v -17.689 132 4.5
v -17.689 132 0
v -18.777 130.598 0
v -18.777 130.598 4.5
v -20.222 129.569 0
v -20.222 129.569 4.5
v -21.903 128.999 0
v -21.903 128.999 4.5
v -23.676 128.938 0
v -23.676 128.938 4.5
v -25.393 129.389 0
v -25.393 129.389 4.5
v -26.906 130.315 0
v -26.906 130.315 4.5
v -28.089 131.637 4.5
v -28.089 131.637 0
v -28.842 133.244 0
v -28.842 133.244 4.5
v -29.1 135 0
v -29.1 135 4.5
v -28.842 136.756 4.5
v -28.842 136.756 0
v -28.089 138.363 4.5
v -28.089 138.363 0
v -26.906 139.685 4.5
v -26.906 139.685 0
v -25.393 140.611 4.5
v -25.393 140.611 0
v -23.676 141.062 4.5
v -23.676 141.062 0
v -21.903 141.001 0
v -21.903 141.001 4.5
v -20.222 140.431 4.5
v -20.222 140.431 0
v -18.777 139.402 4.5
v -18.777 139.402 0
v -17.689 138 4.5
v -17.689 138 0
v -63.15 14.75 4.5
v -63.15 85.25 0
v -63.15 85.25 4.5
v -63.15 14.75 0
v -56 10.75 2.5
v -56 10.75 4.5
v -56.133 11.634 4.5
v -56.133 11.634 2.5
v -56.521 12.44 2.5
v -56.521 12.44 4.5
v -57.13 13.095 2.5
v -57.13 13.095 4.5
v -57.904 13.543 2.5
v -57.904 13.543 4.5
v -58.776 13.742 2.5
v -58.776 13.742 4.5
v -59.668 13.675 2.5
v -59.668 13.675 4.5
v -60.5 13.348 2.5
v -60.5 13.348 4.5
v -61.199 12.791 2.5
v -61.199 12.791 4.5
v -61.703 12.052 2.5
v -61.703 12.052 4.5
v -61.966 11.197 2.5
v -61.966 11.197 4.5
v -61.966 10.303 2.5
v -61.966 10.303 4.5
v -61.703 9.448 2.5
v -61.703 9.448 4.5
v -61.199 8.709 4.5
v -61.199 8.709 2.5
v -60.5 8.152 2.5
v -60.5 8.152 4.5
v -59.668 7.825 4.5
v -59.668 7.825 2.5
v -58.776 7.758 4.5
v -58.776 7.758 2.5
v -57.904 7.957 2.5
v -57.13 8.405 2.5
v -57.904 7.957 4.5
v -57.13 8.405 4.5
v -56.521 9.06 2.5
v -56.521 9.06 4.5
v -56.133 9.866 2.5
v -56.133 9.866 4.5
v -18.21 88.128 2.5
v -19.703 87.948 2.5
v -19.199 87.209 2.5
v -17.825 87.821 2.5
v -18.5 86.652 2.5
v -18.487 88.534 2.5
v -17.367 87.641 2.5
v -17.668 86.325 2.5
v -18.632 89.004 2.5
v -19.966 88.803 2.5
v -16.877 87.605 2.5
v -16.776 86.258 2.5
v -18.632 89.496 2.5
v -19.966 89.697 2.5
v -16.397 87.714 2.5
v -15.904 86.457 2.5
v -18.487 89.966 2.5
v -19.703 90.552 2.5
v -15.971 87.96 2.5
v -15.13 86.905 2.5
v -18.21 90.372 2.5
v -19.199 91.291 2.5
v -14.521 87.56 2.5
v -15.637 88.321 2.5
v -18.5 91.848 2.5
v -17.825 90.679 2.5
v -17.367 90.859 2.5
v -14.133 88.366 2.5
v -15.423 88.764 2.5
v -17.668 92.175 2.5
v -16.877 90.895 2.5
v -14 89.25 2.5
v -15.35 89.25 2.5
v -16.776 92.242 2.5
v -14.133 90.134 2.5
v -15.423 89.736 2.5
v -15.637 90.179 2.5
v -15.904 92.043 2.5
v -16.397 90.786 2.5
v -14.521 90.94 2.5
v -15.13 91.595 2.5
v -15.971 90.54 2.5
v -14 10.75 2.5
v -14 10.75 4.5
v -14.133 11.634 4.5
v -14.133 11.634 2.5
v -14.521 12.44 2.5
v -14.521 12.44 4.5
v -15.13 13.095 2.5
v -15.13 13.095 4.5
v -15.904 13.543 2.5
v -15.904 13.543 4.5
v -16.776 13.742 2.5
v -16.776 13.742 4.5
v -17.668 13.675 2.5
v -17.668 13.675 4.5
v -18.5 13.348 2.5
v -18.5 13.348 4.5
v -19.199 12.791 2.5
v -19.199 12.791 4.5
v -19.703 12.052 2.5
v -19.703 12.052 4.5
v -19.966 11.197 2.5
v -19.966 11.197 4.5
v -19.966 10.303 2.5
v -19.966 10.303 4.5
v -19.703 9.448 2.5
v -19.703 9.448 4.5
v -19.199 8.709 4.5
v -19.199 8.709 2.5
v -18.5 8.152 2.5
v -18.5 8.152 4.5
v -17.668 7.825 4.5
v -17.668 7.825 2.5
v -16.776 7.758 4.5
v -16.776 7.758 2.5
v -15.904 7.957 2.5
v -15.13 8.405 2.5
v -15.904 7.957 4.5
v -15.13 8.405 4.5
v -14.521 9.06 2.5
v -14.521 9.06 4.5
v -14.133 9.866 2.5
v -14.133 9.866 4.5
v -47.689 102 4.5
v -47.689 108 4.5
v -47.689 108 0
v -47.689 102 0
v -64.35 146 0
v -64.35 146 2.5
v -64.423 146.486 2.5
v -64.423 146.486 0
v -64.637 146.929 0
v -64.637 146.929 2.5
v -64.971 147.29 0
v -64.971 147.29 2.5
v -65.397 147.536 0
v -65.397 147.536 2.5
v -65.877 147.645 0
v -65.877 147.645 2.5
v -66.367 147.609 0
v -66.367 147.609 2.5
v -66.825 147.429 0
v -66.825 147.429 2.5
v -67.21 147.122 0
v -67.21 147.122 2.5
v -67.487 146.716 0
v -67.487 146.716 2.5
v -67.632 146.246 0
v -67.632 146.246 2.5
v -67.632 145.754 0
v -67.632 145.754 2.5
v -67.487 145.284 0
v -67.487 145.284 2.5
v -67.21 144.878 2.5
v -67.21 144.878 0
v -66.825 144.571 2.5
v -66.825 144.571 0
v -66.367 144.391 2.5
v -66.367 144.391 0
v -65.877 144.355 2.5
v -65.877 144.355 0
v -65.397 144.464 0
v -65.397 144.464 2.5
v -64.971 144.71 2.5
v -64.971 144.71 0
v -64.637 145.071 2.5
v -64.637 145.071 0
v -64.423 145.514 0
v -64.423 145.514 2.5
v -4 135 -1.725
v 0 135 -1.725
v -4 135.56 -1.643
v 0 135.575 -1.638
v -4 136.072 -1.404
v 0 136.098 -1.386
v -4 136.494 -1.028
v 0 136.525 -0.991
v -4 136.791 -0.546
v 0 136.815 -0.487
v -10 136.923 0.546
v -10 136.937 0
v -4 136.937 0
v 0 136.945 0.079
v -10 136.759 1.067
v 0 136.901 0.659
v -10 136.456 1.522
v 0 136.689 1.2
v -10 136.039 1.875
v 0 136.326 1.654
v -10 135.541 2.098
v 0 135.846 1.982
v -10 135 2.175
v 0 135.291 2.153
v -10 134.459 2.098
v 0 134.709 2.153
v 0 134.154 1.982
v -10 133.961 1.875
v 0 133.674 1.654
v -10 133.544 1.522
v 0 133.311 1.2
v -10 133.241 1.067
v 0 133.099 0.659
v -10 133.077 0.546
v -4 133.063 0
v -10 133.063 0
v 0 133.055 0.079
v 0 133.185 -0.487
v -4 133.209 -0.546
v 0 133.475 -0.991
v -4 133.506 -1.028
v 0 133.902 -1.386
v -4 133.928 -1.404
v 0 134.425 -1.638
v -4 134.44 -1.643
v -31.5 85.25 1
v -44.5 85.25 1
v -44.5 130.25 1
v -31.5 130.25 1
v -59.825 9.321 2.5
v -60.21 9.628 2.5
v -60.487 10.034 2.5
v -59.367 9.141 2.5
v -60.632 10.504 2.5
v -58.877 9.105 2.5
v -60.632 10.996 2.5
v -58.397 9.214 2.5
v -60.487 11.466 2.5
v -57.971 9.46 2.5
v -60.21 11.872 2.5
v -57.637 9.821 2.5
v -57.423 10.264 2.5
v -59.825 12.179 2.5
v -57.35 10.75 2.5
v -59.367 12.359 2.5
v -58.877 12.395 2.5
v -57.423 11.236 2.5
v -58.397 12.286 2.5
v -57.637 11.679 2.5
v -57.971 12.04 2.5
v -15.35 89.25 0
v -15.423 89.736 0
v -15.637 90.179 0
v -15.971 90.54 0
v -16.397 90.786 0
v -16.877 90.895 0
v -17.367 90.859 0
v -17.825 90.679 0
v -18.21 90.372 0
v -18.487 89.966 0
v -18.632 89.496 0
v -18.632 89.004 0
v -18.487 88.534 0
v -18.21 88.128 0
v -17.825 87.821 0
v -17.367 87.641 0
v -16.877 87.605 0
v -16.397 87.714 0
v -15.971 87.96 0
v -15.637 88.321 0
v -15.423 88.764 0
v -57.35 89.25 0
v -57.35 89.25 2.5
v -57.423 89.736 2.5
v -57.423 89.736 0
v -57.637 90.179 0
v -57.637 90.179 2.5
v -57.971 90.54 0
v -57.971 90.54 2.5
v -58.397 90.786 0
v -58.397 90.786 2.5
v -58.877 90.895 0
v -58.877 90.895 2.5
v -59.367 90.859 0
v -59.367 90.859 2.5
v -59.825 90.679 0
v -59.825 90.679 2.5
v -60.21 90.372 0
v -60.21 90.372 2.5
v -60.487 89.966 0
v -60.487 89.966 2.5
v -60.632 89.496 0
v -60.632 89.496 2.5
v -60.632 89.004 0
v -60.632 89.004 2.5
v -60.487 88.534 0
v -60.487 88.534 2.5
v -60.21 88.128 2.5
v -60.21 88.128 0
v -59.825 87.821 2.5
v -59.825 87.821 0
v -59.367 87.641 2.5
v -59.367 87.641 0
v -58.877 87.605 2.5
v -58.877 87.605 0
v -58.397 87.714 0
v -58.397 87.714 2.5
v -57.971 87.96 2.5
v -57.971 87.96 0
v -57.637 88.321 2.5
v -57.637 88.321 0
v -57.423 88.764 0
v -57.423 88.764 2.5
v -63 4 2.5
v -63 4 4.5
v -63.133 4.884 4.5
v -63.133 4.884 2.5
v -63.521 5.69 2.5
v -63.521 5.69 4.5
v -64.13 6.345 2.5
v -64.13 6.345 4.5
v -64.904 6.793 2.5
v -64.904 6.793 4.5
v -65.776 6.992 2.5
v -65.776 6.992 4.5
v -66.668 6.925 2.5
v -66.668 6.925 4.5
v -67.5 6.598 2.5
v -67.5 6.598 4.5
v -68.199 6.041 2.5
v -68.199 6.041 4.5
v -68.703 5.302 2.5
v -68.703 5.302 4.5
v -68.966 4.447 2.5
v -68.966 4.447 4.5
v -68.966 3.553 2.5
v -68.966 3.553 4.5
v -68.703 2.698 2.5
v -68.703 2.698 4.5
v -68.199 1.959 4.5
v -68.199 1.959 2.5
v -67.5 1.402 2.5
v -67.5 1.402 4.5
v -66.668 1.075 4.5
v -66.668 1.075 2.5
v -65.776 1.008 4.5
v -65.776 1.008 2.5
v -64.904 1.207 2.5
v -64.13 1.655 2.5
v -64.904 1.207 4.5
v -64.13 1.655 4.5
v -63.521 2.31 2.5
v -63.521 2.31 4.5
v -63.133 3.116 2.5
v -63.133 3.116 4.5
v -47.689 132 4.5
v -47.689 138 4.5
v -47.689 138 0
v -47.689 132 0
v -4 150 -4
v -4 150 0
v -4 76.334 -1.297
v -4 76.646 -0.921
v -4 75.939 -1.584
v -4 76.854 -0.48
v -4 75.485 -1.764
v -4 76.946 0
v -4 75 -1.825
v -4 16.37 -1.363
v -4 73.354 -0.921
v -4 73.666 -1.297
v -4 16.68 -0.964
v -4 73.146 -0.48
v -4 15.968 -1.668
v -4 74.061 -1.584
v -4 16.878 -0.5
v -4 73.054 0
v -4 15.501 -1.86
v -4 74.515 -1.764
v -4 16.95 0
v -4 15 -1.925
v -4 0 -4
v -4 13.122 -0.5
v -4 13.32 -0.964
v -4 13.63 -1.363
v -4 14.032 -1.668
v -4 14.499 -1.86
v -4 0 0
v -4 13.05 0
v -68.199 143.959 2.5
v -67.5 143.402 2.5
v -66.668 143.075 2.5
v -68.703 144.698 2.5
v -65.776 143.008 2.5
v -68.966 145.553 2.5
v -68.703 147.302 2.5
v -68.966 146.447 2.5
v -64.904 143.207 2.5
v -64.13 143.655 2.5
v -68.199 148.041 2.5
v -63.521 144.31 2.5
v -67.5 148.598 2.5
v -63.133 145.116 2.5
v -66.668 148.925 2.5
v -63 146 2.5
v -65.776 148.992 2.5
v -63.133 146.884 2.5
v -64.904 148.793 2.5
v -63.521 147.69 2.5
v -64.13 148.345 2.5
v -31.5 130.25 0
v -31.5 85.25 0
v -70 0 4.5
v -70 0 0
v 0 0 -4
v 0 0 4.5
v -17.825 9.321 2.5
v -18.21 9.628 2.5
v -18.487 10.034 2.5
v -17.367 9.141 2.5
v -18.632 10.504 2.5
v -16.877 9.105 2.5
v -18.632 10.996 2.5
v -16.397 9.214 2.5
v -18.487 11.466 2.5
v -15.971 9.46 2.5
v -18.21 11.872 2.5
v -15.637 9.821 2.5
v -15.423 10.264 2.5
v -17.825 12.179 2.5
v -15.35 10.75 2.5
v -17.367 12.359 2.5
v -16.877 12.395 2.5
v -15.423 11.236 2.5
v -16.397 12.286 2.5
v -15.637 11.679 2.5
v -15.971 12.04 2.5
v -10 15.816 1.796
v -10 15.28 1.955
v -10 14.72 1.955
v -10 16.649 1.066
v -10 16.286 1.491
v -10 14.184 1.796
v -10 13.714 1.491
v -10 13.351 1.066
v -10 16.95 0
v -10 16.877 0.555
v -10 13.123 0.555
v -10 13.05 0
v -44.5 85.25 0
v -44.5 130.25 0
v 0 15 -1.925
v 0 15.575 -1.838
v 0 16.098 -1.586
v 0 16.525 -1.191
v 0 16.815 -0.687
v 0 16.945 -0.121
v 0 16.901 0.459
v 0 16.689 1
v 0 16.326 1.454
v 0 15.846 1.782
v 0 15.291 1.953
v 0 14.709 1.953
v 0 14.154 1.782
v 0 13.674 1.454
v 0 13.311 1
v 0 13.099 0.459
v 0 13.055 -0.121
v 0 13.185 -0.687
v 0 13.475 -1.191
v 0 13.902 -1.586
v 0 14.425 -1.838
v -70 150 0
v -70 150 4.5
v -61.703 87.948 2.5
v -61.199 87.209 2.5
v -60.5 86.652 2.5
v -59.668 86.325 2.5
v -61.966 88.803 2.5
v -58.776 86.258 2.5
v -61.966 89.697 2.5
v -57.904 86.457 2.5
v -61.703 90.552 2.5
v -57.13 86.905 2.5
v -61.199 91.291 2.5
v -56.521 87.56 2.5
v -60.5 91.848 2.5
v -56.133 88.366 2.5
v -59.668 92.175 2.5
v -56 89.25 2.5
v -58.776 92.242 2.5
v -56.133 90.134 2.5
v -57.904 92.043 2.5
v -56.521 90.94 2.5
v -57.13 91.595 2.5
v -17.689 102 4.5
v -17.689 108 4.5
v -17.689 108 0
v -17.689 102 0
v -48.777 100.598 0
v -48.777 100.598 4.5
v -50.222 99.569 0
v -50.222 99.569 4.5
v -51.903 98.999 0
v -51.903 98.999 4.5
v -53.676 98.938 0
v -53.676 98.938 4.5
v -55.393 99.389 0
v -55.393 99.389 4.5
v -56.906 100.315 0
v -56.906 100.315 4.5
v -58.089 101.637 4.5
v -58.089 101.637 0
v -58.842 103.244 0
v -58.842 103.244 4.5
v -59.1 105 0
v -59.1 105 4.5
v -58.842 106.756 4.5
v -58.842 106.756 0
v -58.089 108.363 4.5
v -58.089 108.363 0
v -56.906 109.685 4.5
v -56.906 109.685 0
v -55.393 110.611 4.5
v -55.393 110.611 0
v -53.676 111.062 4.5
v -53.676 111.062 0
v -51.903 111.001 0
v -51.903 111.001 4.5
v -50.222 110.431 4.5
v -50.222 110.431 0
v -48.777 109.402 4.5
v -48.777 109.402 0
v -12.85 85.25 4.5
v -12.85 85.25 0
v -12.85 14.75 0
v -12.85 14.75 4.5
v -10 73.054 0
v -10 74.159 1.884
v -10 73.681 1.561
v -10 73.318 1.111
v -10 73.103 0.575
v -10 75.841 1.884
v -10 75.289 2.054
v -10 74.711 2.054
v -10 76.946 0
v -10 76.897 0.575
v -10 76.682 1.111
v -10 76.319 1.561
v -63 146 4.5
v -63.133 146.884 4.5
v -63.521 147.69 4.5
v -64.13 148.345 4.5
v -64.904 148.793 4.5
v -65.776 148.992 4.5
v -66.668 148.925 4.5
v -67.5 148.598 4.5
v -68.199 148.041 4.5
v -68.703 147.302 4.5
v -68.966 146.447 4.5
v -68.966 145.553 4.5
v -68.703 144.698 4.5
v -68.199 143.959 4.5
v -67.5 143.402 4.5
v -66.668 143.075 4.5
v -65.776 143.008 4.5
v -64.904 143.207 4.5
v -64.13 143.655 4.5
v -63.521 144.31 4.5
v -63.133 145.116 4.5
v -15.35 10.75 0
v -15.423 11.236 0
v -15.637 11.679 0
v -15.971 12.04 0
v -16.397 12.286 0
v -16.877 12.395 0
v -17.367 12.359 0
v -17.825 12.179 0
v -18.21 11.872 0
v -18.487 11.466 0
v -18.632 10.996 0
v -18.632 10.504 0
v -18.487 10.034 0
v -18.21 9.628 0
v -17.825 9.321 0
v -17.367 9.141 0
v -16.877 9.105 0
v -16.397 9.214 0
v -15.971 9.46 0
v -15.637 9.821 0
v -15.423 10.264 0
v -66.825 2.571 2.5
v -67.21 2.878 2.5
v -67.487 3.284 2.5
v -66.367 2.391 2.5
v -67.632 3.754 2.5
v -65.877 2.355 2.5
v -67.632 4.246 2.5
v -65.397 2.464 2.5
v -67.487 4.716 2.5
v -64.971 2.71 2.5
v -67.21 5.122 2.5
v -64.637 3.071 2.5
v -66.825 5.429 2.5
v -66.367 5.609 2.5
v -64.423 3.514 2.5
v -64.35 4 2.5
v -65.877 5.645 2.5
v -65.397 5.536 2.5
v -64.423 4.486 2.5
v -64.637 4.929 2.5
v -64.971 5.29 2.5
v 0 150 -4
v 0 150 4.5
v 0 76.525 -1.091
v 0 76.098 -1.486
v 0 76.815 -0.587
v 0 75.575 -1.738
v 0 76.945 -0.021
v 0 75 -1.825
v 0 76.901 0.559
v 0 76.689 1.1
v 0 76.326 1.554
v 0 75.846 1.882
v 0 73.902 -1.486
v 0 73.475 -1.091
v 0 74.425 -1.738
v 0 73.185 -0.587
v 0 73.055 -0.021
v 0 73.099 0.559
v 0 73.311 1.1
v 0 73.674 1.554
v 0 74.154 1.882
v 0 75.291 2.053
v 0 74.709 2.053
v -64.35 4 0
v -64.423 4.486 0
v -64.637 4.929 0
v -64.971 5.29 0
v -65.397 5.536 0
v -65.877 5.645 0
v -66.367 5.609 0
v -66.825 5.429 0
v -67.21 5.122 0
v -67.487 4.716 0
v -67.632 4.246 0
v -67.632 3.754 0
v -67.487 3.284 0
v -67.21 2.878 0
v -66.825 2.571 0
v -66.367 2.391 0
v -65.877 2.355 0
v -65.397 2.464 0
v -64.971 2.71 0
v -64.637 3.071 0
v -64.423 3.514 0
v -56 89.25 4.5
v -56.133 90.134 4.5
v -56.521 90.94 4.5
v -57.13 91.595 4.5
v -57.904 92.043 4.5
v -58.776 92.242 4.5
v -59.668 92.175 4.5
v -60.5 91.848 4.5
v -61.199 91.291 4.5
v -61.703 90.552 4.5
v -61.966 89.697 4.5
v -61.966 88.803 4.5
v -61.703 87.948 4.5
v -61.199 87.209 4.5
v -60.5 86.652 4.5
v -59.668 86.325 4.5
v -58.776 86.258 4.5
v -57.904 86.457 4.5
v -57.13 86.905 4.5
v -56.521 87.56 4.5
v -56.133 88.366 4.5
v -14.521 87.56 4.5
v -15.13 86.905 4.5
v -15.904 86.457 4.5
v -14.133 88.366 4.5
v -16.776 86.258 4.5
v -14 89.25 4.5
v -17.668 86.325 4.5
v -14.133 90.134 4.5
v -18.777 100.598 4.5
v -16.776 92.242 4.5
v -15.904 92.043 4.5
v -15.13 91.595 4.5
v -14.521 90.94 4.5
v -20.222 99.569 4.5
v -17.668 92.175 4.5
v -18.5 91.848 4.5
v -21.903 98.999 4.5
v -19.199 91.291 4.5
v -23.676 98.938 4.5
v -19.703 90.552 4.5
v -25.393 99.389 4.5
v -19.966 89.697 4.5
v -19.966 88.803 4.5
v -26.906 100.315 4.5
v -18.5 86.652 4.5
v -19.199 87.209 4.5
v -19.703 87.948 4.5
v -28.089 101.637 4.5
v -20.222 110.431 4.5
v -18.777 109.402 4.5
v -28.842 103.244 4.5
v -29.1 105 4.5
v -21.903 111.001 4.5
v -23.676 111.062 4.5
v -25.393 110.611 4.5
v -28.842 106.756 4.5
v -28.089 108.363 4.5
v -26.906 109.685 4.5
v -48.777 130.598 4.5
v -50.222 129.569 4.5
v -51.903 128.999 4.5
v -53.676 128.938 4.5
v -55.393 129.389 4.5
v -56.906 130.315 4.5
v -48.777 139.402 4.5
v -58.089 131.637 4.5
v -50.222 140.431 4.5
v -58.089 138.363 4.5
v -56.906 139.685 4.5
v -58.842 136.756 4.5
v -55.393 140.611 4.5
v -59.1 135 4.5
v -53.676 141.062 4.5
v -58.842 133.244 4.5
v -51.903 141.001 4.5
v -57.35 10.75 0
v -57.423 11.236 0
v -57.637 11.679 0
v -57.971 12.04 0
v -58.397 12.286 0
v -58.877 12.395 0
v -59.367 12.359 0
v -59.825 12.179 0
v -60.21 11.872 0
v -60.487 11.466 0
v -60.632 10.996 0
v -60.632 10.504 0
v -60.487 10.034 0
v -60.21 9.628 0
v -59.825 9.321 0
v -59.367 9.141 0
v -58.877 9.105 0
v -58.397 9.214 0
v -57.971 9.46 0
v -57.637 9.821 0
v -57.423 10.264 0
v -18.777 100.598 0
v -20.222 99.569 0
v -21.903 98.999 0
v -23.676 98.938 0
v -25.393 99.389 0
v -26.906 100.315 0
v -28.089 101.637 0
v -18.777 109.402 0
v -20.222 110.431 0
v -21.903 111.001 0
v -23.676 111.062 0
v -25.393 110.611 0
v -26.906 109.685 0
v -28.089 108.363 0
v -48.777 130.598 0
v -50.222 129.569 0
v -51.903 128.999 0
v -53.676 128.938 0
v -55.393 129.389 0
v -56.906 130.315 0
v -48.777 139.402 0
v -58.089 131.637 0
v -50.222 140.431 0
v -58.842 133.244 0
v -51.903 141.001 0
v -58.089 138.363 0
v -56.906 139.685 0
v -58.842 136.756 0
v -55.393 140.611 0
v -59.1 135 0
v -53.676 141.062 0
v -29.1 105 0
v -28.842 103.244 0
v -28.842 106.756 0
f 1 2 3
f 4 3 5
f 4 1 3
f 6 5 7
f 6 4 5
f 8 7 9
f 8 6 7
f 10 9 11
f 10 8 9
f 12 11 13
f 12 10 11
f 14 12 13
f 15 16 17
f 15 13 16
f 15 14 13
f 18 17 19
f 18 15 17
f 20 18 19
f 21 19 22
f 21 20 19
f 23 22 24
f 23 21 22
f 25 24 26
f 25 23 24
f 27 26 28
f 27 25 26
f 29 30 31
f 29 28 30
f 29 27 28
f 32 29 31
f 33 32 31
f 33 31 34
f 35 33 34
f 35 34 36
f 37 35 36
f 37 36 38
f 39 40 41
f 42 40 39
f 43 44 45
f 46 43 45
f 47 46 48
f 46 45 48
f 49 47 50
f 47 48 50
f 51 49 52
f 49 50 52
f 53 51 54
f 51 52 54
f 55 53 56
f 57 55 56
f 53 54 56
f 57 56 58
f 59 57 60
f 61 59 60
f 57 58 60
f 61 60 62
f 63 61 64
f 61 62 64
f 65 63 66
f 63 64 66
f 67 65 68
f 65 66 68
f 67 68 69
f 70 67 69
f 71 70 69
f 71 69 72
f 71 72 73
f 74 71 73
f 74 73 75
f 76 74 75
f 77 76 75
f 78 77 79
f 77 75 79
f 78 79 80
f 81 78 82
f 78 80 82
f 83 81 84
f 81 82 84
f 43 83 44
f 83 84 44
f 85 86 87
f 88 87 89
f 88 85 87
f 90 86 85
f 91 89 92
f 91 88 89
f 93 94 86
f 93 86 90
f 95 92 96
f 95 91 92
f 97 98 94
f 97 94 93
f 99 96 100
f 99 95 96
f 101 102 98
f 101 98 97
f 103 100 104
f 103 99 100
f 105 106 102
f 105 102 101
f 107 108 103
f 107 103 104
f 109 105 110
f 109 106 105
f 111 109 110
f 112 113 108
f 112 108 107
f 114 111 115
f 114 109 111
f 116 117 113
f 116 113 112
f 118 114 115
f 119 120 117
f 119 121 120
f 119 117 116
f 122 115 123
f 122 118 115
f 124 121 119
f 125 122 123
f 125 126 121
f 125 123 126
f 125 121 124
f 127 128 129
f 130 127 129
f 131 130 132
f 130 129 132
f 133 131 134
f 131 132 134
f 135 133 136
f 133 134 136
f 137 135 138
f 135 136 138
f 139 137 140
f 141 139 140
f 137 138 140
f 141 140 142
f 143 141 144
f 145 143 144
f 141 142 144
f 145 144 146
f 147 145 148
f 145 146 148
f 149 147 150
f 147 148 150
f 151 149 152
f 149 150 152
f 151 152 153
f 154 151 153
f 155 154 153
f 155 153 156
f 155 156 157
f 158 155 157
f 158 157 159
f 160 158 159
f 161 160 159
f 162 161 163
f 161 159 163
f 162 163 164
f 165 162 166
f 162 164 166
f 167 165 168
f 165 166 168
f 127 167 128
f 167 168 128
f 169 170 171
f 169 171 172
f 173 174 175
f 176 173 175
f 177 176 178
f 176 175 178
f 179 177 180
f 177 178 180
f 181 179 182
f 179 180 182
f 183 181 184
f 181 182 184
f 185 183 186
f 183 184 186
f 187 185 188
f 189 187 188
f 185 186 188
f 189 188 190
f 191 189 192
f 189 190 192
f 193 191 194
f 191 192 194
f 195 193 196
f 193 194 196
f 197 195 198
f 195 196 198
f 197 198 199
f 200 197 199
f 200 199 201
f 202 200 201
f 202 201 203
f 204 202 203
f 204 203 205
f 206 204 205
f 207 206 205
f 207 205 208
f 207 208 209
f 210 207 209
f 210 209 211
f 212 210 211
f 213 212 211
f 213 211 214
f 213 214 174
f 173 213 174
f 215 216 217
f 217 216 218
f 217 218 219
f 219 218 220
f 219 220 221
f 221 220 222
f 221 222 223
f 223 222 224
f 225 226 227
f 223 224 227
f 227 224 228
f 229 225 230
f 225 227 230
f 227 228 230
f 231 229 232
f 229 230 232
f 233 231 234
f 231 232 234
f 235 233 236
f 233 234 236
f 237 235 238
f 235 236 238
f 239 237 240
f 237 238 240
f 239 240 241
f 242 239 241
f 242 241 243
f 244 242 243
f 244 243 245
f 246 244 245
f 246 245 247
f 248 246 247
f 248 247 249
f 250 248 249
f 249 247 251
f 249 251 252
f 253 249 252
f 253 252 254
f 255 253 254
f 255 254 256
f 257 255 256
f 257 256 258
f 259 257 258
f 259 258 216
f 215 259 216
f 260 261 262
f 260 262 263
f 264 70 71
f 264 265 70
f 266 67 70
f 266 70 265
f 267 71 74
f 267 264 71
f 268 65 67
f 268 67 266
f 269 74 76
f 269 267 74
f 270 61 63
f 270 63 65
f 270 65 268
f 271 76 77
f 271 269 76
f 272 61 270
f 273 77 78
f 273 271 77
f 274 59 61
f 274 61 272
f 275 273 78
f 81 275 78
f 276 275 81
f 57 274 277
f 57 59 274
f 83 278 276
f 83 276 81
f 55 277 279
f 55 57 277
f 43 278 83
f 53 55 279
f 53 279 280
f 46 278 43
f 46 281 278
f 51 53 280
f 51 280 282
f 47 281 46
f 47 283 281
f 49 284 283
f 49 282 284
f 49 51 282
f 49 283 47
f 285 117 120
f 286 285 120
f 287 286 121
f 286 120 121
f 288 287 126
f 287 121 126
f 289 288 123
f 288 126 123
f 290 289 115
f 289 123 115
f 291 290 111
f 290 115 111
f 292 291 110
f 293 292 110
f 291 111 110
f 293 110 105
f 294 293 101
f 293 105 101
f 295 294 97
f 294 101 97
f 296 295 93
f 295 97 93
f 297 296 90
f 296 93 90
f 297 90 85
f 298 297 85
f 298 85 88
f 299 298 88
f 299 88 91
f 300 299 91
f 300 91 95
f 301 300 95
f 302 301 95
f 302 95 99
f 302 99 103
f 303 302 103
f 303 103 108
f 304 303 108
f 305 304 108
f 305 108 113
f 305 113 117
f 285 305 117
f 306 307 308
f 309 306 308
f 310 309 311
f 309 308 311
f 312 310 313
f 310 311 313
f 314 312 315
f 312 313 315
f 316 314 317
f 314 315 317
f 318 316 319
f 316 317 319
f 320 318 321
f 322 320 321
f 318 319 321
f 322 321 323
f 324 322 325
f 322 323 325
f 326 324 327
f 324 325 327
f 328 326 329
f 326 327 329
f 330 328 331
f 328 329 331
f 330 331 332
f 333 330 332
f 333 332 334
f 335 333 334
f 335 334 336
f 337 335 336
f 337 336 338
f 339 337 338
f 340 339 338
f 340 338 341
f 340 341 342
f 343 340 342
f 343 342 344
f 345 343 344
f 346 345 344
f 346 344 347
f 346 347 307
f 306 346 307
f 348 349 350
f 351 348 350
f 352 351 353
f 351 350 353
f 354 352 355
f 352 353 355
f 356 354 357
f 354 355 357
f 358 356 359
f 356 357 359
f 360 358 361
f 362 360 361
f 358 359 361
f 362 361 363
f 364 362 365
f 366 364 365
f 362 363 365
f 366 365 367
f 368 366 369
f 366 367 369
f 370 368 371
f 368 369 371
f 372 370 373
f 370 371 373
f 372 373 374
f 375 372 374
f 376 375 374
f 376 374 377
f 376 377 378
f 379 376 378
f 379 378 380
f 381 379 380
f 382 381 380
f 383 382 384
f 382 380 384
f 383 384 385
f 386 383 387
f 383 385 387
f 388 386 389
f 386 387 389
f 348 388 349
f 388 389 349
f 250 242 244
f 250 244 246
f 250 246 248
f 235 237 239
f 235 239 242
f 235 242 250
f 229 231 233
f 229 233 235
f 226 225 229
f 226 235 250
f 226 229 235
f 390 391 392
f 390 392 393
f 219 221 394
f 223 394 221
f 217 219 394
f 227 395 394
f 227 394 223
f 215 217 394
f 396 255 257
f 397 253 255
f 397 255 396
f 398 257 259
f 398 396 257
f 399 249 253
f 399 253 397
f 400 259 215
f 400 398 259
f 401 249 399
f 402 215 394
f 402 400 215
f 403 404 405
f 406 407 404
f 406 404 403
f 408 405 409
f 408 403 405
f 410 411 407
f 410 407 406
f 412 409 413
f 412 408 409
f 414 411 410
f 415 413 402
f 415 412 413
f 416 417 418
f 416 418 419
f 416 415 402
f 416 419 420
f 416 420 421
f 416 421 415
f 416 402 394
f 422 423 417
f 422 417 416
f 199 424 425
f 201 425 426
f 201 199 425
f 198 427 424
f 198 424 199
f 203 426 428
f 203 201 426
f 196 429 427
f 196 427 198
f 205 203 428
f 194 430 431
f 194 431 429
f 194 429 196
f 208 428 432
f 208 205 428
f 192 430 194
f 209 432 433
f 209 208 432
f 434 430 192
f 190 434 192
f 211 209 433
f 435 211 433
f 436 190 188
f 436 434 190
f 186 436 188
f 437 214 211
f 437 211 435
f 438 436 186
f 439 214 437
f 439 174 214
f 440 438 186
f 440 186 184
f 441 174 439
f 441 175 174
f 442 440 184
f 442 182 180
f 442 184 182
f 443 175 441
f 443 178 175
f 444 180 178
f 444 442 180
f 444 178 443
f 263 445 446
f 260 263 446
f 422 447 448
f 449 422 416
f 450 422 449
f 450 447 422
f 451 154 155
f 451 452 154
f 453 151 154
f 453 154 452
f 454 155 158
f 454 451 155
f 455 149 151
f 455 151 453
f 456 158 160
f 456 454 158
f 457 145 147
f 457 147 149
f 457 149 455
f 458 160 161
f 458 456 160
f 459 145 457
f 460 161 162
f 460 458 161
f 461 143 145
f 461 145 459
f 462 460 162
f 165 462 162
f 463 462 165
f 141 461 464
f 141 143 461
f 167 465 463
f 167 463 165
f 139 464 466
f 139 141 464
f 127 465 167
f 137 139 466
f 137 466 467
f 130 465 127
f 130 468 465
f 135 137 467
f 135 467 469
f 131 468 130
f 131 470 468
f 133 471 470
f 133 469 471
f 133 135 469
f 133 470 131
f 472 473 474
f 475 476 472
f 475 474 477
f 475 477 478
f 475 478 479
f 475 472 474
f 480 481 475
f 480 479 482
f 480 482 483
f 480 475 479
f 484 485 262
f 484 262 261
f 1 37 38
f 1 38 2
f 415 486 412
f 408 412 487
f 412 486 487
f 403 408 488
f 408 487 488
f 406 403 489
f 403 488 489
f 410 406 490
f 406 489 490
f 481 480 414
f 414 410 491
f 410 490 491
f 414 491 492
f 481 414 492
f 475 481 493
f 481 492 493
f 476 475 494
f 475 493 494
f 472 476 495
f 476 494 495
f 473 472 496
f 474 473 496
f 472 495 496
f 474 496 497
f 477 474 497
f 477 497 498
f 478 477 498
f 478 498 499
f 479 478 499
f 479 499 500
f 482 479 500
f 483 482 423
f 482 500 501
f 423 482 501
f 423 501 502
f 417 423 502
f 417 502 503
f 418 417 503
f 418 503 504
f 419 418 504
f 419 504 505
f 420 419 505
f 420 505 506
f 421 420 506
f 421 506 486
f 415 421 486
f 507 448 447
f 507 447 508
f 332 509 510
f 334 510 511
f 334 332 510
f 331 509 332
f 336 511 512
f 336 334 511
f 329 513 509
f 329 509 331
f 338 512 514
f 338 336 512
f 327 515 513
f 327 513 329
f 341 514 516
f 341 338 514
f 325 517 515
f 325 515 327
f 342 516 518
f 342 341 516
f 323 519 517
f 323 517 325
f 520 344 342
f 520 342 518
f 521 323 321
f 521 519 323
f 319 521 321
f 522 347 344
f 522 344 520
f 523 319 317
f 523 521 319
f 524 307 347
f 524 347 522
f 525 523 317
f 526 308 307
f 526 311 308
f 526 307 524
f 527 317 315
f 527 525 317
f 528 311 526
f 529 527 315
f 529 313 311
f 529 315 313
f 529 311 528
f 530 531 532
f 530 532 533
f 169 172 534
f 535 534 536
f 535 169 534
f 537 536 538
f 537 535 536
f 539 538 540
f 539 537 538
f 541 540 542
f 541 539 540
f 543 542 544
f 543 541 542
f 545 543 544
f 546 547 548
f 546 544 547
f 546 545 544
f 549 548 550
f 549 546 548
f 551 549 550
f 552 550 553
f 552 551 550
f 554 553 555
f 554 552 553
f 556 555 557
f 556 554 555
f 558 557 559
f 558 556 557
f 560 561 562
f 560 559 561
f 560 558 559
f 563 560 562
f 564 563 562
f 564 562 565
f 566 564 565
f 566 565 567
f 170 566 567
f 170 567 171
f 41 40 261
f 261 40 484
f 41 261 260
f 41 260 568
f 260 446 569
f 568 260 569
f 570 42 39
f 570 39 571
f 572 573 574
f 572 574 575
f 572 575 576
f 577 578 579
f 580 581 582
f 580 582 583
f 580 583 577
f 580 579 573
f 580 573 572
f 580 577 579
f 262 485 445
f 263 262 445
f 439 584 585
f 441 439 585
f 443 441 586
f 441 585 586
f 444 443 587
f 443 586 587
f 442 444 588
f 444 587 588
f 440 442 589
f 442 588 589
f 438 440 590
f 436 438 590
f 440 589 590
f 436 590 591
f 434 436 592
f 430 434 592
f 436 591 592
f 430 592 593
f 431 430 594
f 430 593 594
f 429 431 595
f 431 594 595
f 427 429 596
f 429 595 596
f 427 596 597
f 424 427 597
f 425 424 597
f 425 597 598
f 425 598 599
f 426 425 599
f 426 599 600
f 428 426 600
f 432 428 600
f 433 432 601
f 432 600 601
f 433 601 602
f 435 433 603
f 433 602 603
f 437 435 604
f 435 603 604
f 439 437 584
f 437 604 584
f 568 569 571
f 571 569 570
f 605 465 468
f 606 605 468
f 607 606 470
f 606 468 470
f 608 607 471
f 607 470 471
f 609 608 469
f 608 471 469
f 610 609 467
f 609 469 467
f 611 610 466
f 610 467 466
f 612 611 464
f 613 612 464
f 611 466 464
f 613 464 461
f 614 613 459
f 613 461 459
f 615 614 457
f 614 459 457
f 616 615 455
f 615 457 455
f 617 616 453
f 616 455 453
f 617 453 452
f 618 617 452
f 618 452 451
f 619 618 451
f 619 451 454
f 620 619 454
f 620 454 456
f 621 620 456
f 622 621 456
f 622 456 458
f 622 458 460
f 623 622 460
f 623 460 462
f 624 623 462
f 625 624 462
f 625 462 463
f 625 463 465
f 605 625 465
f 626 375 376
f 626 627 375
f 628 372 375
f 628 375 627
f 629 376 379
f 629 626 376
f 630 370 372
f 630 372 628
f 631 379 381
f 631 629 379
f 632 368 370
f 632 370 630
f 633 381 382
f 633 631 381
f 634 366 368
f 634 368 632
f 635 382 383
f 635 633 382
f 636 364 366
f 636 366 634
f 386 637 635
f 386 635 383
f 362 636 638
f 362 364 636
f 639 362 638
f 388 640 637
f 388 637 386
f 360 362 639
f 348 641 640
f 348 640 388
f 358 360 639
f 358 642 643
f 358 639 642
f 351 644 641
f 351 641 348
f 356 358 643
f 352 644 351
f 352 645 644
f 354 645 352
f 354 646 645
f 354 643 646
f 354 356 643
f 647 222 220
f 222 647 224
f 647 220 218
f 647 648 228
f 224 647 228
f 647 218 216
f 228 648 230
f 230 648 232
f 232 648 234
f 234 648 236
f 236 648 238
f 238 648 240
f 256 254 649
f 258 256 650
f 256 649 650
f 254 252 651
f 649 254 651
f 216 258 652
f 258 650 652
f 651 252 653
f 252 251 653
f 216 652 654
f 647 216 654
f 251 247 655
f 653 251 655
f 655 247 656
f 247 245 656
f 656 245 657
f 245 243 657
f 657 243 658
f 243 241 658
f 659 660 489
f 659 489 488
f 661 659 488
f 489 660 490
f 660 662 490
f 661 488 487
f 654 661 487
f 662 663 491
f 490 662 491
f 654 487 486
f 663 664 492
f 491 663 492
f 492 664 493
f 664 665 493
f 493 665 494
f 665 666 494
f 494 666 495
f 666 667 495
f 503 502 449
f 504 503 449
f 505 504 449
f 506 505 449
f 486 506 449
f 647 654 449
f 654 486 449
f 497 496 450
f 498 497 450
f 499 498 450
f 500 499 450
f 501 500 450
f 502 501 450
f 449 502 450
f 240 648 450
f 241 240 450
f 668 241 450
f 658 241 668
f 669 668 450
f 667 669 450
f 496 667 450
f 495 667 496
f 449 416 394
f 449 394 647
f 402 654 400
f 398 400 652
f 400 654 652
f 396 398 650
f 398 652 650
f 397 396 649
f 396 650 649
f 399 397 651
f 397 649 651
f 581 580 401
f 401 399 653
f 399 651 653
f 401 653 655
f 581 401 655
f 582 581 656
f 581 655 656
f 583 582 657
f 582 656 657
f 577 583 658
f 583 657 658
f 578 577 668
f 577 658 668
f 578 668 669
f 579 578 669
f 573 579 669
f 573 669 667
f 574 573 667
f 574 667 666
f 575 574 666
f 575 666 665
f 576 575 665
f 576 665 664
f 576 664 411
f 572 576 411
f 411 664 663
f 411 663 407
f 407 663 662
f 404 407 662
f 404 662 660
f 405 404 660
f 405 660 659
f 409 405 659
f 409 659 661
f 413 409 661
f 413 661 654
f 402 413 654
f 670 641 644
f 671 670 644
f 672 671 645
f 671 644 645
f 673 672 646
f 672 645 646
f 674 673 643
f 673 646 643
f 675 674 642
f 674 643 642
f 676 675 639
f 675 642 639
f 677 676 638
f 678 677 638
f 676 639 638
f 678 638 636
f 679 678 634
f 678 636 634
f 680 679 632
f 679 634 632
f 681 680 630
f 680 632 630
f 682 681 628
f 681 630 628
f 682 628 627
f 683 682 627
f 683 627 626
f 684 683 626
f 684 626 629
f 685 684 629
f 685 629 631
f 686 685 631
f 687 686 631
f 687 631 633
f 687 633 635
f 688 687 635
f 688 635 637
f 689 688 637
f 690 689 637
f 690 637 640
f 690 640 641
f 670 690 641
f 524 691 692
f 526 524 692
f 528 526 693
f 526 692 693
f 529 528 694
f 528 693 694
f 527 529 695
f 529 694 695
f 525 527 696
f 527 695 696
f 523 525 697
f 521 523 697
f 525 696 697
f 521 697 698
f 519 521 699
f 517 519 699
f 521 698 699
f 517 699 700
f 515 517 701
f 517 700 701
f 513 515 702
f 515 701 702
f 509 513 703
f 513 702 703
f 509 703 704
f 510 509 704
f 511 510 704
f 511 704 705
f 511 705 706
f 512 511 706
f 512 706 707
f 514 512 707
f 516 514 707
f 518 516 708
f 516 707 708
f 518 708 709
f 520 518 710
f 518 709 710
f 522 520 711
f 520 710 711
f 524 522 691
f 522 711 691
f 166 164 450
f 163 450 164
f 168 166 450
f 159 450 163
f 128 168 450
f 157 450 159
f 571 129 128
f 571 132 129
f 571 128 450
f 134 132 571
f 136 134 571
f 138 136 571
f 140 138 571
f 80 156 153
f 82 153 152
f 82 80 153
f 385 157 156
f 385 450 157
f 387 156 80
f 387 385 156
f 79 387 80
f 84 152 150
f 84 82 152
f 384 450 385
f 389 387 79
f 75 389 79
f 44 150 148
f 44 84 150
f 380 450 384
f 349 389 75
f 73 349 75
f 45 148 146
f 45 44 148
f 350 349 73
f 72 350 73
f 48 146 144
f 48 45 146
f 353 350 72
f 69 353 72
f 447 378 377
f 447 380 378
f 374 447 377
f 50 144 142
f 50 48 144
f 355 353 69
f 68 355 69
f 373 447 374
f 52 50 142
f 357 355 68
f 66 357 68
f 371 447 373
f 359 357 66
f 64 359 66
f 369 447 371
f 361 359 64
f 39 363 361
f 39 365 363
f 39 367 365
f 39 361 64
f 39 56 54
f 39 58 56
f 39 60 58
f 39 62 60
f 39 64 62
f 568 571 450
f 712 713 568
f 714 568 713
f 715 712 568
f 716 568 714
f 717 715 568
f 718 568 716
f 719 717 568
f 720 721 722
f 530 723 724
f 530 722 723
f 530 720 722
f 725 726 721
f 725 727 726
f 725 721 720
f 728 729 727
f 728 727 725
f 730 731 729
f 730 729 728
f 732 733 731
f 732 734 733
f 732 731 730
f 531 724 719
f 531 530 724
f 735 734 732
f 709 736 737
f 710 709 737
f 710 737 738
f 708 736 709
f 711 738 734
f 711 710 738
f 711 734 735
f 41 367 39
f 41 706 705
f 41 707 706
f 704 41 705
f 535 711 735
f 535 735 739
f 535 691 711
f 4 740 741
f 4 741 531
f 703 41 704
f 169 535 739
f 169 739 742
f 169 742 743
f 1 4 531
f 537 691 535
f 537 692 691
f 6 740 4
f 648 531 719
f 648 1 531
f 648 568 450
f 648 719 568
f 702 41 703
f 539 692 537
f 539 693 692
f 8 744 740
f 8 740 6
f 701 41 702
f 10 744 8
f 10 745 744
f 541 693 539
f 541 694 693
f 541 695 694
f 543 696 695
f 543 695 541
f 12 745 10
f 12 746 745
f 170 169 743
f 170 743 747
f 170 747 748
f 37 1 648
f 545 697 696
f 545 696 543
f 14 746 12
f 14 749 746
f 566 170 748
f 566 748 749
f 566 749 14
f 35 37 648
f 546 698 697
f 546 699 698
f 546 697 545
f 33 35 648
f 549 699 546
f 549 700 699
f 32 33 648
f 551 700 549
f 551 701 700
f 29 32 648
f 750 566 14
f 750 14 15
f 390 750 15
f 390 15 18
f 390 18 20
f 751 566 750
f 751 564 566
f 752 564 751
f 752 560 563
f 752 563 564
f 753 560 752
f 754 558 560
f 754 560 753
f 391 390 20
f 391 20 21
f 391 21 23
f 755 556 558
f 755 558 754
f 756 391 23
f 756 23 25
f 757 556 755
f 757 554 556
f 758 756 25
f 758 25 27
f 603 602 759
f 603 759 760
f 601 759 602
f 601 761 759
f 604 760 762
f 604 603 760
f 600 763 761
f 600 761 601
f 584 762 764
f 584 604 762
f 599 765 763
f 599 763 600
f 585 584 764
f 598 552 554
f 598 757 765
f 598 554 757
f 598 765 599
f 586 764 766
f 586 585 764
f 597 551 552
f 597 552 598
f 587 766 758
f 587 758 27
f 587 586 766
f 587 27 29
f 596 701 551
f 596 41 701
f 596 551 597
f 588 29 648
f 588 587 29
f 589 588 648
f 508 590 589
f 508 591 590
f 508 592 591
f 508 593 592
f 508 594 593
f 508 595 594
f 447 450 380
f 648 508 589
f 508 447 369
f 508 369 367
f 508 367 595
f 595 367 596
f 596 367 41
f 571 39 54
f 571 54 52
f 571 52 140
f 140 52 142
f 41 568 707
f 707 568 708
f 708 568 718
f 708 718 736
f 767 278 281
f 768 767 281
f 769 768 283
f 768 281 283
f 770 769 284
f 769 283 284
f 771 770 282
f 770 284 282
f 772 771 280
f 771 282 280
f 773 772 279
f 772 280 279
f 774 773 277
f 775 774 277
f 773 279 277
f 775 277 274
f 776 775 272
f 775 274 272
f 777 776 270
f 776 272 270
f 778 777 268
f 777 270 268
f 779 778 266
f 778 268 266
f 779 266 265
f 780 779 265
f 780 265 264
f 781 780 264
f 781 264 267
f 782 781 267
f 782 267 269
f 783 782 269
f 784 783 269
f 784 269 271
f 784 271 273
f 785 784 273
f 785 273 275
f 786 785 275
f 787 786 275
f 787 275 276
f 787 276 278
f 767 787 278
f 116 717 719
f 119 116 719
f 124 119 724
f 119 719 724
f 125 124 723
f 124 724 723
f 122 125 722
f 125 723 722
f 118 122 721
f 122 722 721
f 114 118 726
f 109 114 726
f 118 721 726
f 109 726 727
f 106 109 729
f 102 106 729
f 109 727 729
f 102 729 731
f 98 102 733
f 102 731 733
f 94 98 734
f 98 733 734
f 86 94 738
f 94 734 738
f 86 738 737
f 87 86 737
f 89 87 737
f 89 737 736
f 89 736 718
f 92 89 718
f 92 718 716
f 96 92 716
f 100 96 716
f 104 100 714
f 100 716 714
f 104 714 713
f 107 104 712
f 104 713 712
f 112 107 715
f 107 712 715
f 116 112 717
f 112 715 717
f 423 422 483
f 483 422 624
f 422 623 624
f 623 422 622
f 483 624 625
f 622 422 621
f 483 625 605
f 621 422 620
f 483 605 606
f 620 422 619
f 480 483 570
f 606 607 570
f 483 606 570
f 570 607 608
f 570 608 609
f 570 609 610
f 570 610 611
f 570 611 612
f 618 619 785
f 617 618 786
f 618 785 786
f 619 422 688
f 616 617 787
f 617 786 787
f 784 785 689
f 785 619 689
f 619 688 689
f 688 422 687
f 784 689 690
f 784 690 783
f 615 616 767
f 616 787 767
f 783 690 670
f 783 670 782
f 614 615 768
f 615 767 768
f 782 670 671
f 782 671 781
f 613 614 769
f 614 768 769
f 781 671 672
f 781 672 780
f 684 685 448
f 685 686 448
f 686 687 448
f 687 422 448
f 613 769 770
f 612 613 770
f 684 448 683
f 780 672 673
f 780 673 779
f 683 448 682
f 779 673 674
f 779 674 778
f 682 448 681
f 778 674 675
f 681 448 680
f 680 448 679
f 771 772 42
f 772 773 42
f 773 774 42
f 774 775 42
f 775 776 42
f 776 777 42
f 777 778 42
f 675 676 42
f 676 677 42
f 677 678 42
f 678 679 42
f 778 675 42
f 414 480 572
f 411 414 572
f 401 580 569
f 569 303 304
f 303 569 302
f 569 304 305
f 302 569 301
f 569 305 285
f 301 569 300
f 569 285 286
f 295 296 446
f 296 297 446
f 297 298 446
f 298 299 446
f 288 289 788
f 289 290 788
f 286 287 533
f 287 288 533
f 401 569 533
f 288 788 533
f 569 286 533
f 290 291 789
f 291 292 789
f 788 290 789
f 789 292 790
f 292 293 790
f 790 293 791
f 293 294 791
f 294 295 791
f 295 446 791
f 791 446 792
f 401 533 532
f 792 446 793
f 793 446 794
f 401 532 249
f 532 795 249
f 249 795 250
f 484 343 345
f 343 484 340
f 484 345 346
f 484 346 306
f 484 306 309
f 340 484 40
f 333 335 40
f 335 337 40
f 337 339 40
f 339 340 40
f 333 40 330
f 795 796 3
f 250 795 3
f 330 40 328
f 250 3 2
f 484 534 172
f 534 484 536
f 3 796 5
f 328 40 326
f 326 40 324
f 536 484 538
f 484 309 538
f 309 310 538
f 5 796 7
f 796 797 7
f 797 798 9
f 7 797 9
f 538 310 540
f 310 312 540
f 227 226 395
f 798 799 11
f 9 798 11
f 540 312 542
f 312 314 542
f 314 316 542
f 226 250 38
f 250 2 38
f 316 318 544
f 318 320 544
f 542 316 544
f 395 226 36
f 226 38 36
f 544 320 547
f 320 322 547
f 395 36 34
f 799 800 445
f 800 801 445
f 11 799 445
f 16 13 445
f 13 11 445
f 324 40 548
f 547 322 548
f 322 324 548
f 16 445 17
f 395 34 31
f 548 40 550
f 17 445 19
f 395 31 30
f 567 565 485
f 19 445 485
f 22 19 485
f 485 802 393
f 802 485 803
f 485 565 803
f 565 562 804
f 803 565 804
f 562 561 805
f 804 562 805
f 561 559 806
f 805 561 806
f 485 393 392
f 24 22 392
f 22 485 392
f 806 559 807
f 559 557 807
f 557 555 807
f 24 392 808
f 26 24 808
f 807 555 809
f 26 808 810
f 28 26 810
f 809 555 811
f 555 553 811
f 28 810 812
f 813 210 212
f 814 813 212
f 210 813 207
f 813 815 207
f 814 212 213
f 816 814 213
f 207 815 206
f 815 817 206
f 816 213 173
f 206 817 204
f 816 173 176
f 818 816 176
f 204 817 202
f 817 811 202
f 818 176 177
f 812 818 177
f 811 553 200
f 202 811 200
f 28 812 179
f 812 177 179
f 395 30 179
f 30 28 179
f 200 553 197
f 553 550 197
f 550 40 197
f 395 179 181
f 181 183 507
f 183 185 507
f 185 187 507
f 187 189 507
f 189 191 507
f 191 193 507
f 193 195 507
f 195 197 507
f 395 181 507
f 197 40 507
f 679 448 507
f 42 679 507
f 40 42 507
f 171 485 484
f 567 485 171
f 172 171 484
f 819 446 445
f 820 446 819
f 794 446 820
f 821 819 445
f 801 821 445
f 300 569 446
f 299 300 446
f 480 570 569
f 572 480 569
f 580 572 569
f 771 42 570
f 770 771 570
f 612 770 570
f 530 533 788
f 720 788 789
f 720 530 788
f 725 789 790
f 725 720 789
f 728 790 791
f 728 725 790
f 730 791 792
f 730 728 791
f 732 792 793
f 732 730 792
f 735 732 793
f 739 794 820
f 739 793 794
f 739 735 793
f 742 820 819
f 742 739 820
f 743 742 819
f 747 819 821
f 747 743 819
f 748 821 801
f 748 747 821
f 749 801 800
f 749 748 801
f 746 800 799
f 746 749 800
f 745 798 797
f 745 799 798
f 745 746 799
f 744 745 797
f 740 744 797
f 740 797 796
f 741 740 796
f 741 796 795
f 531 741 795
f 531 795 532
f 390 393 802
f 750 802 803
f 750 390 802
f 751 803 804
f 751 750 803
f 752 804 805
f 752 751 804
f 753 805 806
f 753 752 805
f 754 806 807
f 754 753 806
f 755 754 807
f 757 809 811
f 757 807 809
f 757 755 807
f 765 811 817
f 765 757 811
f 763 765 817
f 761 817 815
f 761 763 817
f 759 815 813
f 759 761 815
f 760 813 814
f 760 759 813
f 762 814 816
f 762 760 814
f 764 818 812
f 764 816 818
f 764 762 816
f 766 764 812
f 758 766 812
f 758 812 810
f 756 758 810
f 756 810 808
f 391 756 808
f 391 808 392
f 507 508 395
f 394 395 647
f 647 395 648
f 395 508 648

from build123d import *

# Parameters (mm, degrees)
SKETCH1_W           = 150
SKETCH1_H           = 70
BOSS_EXTRUDE1_DEPTH = 4.5
SKETCH2_W           = 50.3
SKETCH2_H           = 70.5
CUT_EXTRUDE1_DEPTH  = 166.590609637
CUT_EXTRUDE2_DEPTH  = 166.590609637
SKETCH4_R           = 1.65
CUT_EXTRUDE3_DEPTH  = 166.590609637
SKETCH5_R           = 3
CUT_EXTRUDE4_DEPTH  = 2
SKETCH7_W           = 4
SKETCH7_H           = 150
BOSS_EXTRUDE2_DEPTH = 4
SKETCH8_R           = 1.95
CUT_EXTRUDE5_DEPTH  = 10
SKETCH10_W          = 13
SKETCH10_H          = 45
CUT_EXTRUDE6_DEPTH  = 1


with BuildPart() as part:
    # Sketch1 → Boss-Extrude1 (new body)
    with BuildSketch(Plane(origin=(0, 0, 0), x_dir=(0, 1, 0), z_dir=(0, 0, 1))):
        with Locations((75, 35)):
            Rectangle(SKETCH1_W, SKETCH1_H)
    extrude(amount=BOSS_EXTRUDE1_DEPTH)

    # Sketch2 → Cut-Extrude1 (cut, through all)
    with BuildSketch(Plane(origin=(0, 0, 0), x_dir=(1, 0, 0), z_dir=(0, 0, -1))):
        with Locations((-38, -50)):
            Rectangle(SKETCH2_W, SKETCH2_H)
    extrude(amount=-CUT_EXTRUDE1_DEPTH, mode=Mode.SUBTRACT)

    # Sketch3 → Cut-Extrude2 (cut, through all)
    with BuildSketch(Plane.XY.offset(4.5)):
        with BuildLine():
            Line((-47.68869131, 108), (-47.68869131, 102))
            ThreePointArc((-47.68869131, 102), (-59.1, 105), (-47.68869131, 108))
        make_face()
        with BuildLine():
            Line((-47.68869131, 138), (-47.68869131, 132))
            ThreePointArc((-47.68869131, 132), (-59.1, 135), (-47.68869131, 138))
        make_face()
        with BuildLine():
            Line((-17.68869131, 138), (-17.68869131, 132))
            ThreePointArc((-17.68869131, 132), (-29.1, 135), (-17.68869131, 138))
        make_face()
        with BuildLine():
            Line((-17.68869131, 108), (-17.68869131, 102))
            ThreePointArc((-17.68869131, 102), (-29.1, 105), (-17.68869131, 108))
        make_face()
    extrude(amount=-CUT_EXTRUDE2_DEPTH, mode=Mode.SUBTRACT)

    # Sketch4 → Cut-Extrude3 (cut, through all)
    with BuildSketch(Plane.XY.offset(4.5)):
        with Locations((-59, 89.25)):
            Circle(SKETCH4_R)
        with Locations((-17, 89.25)):
            Circle(SKETCH4_R)
        with Locations((-17, 10.75)):
            Circle(SKETCH4_R)
        with Locations((-59, 10.75)):
            Circle(SKETCH4_R)
        with Locations((-66, 146)):
            Circle(SKETCH4_R)
        with Locations((-66, 4)):
            Circle(SKETCH4_R)
    extrude(amount=-CUT_EXTRUDE3_DEPTH, mode=Mode.SUBTRACT)

    # Sketch5 → Cut-Extrude4 (cut)
    with BuildSketch(Plane.XY.offset(4.5)):
        with Locations((-59, 89.25)):
            Circle(SKETCH5_R)
        with Locations((-17, 89.25)):
            Circle(SKETCH5_R)
        with Locations((-17, 10.75)):
            Circle(SKETCH5_R)
        with Locations((-59, 10.75)):
            Circle(SKETCH5_R)
        with Locations((-66, 146)):
            Circle(SKETCH5_R)
        with Locations((-66, 4)):
            Circle(SKETCH5_R)
    extrude(amount=-CUT_EXTRUDE4_DEPTH, mode=Mode.SUBTRACT)

    # Sketch7 → Boss-Extrude2 (add)
    with BuildSketch(Plane(origin=(0, 0, 0), x_dir=(1, 0, 0), z_dir=(0, 0, -1))):
        with Locations((-2, -75)):
            Rectangle(SKETCH7_W, SKETCH7_H)
    extrude(amount=BOSS_EXTRUDE2_DEPTH)

    # Sketch8 → Cut-Extrude5 (cut)
    with BuildSketch(Plane.YZ):
        with Locations(Location((15, 0.025, 0), (0, 0, 270))):
            Circle(SKETCH8_R)
        with Locations(Location((75, 0.125, 0), (0, 0, 270))):
            Circle(SKETCH8_R)
        with Locations(Location((135, 0.225, 0), (0, 0, 270))):
            Circle(SKETCH8_R)
    extrude(amount=-CUT_EXTRUDE5_DEPTH, mode=Mode.SUBTRACT)

    # Sketch10 → Cut-Extrude6 (cut)
    with BuildSketch(Plane(origin=(0, 0, 0), x_dir=(1, 0, 0), z_dir=(0, 0, -1))):
        with Locations((-38, -107.75)):
            Rectangle(SKETCH10_W, SKETCH10_H)
    extrude(amount=-CUT_EXTRUDE6_DEPTH, mode=Mode.SUBTRACT)


solid = part.part
